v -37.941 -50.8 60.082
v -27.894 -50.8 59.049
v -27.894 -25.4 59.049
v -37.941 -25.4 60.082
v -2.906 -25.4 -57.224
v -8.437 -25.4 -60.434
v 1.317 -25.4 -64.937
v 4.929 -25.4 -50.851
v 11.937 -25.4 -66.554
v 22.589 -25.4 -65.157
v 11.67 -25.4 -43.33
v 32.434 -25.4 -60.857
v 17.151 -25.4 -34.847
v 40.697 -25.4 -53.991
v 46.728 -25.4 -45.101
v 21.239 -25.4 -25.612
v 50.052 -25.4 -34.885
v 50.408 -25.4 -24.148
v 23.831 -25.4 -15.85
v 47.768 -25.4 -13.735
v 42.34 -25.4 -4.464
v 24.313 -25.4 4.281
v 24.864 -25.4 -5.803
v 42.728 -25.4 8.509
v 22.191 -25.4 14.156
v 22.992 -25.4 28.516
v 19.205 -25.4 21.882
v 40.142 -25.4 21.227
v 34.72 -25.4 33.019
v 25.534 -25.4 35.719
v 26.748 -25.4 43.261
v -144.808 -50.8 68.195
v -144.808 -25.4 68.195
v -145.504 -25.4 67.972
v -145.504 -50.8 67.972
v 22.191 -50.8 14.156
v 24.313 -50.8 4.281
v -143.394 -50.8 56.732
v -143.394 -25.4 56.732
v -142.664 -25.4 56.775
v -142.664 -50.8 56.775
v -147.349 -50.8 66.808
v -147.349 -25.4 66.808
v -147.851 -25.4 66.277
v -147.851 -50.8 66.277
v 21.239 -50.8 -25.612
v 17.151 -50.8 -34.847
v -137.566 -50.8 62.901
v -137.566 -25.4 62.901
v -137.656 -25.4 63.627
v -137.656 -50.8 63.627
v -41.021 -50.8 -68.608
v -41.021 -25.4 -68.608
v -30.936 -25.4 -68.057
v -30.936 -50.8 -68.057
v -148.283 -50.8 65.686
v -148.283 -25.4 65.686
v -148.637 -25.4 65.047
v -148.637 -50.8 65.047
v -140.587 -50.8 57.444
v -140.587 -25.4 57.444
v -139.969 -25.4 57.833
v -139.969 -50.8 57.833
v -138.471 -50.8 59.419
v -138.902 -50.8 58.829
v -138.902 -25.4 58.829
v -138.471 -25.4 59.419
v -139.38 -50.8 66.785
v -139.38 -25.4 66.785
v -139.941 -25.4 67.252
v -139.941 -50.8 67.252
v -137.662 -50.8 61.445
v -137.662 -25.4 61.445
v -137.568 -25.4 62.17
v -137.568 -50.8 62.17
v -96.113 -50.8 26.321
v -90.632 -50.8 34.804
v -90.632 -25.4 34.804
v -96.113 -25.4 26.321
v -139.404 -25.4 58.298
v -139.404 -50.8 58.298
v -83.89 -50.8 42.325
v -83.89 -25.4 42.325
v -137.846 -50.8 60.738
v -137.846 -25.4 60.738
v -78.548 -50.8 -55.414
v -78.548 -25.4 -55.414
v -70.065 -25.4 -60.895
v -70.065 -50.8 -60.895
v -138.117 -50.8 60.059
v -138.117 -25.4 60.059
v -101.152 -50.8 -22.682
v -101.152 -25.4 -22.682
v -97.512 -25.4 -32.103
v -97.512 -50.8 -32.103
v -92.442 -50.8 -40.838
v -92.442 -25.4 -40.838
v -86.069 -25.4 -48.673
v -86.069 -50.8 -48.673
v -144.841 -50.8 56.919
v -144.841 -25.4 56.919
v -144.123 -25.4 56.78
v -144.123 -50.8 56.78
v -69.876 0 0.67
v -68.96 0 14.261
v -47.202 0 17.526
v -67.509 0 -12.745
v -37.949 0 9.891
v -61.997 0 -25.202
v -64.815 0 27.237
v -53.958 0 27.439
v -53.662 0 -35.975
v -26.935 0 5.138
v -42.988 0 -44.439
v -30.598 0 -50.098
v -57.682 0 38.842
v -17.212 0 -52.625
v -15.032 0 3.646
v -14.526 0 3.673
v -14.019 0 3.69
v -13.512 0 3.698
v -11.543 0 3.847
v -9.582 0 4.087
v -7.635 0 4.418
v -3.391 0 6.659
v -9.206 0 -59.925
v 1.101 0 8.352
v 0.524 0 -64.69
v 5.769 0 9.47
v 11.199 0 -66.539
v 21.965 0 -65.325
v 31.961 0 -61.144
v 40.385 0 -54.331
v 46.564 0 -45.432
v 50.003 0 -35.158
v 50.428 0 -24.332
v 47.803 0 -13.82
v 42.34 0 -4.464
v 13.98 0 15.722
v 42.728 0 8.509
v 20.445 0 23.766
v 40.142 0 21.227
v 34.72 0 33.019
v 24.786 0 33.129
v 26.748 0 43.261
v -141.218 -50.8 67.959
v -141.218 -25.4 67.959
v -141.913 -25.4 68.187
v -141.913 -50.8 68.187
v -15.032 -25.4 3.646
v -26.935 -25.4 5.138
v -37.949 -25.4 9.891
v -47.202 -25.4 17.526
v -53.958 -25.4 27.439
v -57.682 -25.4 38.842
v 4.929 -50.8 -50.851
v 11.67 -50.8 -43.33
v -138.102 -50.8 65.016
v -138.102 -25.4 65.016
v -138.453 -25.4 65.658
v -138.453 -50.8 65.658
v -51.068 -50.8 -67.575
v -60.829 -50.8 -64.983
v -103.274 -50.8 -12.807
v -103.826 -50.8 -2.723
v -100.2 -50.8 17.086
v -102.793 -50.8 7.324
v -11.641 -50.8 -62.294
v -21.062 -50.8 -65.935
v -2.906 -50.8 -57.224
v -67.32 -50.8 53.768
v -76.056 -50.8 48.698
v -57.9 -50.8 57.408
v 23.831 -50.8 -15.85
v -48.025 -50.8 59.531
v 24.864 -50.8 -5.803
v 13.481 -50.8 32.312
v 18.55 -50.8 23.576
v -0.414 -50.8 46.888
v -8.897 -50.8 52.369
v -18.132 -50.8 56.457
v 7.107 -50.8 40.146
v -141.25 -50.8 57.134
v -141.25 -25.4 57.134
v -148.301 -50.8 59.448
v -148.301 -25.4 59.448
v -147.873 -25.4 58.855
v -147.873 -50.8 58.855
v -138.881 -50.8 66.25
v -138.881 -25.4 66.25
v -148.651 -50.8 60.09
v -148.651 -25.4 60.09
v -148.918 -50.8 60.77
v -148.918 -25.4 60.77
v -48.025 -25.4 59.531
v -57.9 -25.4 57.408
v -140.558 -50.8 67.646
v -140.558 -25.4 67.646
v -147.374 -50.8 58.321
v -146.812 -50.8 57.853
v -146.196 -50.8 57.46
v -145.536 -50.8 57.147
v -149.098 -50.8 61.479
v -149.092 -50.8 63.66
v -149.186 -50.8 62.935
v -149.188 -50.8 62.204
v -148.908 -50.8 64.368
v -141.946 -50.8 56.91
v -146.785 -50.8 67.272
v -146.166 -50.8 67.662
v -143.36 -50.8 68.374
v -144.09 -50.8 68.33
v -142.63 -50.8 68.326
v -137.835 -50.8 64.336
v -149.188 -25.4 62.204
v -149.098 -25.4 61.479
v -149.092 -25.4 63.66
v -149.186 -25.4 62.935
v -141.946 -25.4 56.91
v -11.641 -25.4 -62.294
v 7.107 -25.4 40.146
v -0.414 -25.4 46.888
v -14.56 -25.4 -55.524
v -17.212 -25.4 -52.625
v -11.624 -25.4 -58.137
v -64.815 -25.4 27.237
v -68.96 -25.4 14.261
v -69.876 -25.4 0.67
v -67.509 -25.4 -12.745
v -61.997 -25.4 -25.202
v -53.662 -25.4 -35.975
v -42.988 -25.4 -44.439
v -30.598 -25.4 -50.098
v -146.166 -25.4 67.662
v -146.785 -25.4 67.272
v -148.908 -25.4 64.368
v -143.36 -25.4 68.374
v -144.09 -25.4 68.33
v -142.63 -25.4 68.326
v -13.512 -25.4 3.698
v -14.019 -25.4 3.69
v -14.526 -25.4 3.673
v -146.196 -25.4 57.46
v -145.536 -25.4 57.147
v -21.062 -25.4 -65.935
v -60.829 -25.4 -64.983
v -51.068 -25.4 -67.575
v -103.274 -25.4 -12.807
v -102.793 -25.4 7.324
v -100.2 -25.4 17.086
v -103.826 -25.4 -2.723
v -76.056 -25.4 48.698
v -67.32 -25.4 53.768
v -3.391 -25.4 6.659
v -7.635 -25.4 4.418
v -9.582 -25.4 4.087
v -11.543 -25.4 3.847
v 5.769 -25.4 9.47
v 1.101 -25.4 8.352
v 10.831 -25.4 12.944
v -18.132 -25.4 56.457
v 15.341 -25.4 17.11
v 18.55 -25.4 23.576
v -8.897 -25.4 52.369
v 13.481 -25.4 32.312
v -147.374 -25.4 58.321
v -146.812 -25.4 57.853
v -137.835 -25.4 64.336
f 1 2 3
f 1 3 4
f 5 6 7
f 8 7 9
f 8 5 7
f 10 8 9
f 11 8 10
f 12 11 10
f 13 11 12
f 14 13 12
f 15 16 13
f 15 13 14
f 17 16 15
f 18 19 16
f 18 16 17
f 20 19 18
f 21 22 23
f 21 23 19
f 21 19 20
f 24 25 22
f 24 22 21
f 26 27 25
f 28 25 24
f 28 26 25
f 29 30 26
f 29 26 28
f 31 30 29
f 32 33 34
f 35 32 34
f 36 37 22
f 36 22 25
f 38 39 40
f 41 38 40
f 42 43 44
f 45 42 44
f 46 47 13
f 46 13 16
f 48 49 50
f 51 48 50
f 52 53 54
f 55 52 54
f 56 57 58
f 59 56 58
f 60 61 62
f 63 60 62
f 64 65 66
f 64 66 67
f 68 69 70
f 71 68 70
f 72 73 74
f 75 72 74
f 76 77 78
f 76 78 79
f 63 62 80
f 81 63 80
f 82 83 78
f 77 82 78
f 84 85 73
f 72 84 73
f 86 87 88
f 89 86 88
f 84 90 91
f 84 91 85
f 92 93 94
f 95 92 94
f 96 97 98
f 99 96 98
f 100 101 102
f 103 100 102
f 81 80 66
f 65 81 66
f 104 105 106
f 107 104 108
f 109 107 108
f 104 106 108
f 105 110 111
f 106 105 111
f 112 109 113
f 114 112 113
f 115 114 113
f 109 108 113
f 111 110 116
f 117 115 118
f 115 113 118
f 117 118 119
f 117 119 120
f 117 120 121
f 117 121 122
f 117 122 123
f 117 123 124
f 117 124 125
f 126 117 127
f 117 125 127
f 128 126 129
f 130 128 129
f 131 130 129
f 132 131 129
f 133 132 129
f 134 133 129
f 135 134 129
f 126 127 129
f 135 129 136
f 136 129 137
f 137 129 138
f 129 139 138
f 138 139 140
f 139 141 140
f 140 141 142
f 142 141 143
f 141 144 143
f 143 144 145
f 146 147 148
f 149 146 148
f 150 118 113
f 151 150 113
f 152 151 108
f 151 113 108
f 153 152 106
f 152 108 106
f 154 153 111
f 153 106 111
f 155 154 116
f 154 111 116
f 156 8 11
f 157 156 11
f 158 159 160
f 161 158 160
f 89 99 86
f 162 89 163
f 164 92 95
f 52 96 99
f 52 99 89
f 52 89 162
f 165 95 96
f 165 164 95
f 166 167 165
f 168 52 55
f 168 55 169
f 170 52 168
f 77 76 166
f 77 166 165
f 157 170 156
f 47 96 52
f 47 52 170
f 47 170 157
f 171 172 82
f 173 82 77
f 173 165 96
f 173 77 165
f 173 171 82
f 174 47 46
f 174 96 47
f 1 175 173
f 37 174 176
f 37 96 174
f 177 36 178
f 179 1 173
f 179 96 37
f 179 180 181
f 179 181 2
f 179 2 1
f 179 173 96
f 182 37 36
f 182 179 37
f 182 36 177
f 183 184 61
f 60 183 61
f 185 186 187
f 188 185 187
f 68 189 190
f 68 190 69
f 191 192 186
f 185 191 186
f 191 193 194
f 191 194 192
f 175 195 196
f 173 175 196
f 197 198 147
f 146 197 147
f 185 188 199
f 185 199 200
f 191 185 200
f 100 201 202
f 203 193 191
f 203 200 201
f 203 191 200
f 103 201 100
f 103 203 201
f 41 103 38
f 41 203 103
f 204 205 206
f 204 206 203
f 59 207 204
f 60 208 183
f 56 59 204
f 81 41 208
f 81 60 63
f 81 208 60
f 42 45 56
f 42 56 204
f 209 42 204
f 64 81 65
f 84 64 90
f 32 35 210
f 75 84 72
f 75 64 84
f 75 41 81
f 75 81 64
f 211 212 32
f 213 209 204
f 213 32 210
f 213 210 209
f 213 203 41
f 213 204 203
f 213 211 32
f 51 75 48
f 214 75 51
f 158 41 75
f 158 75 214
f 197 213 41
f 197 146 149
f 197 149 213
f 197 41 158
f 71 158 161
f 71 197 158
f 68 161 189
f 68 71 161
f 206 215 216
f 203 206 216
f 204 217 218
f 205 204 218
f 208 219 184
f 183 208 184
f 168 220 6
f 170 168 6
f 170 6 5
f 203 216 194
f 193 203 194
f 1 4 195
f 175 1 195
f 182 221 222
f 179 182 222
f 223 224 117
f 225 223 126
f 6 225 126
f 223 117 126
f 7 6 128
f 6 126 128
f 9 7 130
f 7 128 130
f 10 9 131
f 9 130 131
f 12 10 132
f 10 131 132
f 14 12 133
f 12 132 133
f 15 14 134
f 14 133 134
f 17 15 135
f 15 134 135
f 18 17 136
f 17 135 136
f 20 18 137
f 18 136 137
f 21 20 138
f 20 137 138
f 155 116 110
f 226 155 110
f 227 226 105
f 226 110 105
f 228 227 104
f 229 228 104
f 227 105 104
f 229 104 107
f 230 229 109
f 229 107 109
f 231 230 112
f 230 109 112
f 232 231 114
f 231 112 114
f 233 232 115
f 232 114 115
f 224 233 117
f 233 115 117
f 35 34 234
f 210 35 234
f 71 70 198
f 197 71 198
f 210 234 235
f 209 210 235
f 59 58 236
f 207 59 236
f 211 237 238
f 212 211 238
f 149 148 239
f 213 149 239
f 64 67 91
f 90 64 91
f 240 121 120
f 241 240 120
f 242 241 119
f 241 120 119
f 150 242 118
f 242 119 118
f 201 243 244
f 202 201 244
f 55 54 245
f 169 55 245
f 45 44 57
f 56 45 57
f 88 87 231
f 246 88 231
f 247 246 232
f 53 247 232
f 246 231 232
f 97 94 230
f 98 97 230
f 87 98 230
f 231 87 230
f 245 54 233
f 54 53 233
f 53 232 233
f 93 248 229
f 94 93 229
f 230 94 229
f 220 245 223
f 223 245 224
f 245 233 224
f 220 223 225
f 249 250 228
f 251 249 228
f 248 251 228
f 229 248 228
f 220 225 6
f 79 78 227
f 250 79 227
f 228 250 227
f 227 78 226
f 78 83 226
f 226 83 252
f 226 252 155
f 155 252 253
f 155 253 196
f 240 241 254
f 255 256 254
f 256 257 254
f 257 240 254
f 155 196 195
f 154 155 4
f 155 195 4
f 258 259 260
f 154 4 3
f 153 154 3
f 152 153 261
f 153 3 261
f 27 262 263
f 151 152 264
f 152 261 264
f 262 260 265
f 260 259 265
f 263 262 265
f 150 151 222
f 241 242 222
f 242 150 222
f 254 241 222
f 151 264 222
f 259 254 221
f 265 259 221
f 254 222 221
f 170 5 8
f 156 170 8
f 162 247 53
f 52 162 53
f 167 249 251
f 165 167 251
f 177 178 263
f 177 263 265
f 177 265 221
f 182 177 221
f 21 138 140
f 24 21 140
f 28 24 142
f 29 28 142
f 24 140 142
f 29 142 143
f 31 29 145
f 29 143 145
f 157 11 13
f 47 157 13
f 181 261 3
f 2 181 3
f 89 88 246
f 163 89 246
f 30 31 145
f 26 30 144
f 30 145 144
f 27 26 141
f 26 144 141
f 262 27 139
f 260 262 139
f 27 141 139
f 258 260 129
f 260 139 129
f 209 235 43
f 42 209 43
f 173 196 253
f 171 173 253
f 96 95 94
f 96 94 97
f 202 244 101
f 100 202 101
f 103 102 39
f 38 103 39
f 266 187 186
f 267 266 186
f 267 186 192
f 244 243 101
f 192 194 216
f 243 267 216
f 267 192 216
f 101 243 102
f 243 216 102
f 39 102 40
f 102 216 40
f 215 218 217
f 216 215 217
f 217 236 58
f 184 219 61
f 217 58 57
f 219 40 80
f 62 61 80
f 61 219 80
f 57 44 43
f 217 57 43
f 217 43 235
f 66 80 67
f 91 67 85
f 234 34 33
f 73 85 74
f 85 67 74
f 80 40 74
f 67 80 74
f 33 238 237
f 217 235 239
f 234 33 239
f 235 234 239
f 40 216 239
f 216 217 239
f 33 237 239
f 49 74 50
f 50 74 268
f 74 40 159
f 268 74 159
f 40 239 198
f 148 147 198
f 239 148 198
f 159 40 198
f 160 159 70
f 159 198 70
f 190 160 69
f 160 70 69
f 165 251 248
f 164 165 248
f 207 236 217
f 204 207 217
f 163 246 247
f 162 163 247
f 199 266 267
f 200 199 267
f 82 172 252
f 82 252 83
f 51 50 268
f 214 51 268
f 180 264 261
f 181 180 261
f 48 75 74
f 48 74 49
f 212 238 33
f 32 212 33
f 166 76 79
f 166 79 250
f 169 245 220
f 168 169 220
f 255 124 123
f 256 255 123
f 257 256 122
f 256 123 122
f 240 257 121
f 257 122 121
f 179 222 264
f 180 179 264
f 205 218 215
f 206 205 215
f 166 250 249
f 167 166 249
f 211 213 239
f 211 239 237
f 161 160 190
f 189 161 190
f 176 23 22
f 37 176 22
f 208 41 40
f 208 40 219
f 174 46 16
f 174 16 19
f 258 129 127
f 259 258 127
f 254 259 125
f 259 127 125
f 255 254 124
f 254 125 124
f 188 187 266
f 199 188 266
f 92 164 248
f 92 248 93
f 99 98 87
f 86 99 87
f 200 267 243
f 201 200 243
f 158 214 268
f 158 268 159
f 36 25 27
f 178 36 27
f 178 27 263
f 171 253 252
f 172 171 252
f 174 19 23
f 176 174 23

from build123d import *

# Parameters (mm, degrees)
F1_DEPTH = 25.4
F3_DEPTH = 25.4


with BuildPart() as f1:
    # F0 (on Front) → F1 (new body)
    with BuildSketch(Plane.XZ):
        with BuildLine():
            ThreePointArc((-15.032011, 3.646128), (-42.845656, 13.381075), (-57.681628, 38.842063))
            ThreePointArc((-57.681628, 38.842063), (-65.130136, -19.139923), (-17.212109, -52.62505))
            ThreePointArc((-17.212109, -52.62505), (-41.574986, -23.503346), (-15.032011, 3.646128))
        make_face()
        with BuildLine():
            ThreePointArc((-15.032011, 3.646128), (-41.574986, -23.503346), (-17.212109, -52.62505))
            ThreePointArc((-17.212109, -52.62505), (21.981795, -40.190329), (42.339665, -4.464406))
            ThreePointArc((42.339665, -4.464406), (25.968523, 7.526778), (5.768808, 9.469525))
            ThreePointArc((5.768808, 9.469525), (-0.719315, 6.376283), (-7.63522, 4.418187))
            ThreePointArc((-7.63522, 4.418187), (-10.561051, 3.956097), (-13.511925, 3.698495))
            ThreePointArc((-13.511925, 3.698495), (-14.271734, 3.665525), (-15.032011, 3.646128))
        make_face()
        with BuildLine():
            ThreePointArc((42.339665, -4.464406), (21.981795, -40.190329), (-17.212109, -52.62505))
            ThreePointArc((-17.212109, -52.62505), (36.414816, -58.0371), (42.339665, -4.464406))
        make_face()
        with BuildLine():
            ThreePointArc((-13.511925, 3.698495), (-14.27232, 3.682526), (-15.032011, 3.646128))
            ThreePointArc((-15.032011, 3.646128), (-14.271734, 3.665525), (-13.511925, 3.698495))
        make_face()
        with BuildLine():
            ThreePointArc((5.768808, 9.469525), (25.968523, 7.526778), (42.339665, -4.464406))
            ThreePointArc((42.339665, -4.464406), (40.142218, 21.227498), (26.747528, 43.261223))
            ThreePointArc((26.747528, 43.261223), (20.4452, 23.765961), (5.768808, 9.469525))
        make_face()
        with BuildLine():
            ThreePointArc((-7.63522, 4.418187), (-0.719315, 6.376283), (5.768808, 9.469525))
            ThreePointArc((5.768808, 9.469525), (-1.171482, 7.576136), (-7.63522, 4.418187))
        make_face()
    extrude(amount=F1_DEPTH)

    # F2 (on face) → F3 (join)
    with BuildSketch(Plane.XZ.offset(25.4)):
        Polygon((-21.062149, -65.934605), (-11.641358, -62.294), (-2.906069, -57.224481), (4.928627, -50.850876), (11.669813, -43.330124), (17.151499, -34.847411), (21.238708, -25.61161), (23.830799, -15.850136), (24.863947, -5.80335), (24.31271, 4.281363), (22.190664, 14.155685), (18.55006, 23.576476), (13.480541, 32.311765), (7.106935, 40.146461), (-0.413817, 46.887647), (-8.89653, 52.369334), (-18.132331, 56.456543), (-27.893805, 59.048634), (-37.940591, 60.081781), (-48.025304, 59.530545), (-57.899625, 57.408498), (-67.320416, 53.767894), (-76.055706, 48.698375), (-83.890402, 42.324769), (-90.631588, 34.804017), (-96.113274, 26.321305), (-100.200483, 17.085503), (-102.792574, 7.32403), (-103.825721, -2.722757), (-103.274485, -12.80747), (-101.152439, -22.681791), (-97.511834, -32.102582), (-92.442315, -40.837871), (-86.06871, -48.672567), (-78.547958, -55.413754), (-70.065245, -60.89544), (-60.829444, -64.982649), (-51.06797, -67.57474), (-41.021184, -68.607887), (-30.936471, -68.056651), align=None)
        Polygon((-139.969022, 57.833415), (-139.404385, 58.297749), (-138.902397, 58.829188), (-138.470974, 59.419353), (-138.11692, 60.058936), (-137.845819, 60.737851), (-137.661946, 61.445389), (-137.568202, 62.170395), (-137.566063, 62.901432), (-137.655565, 63.626973), (-137.835296, 64.335575), (-138.102421, 65.016064), (-138.452727, 65.657707), (-138.88069, 66.250386), (-139.379561, 66.784753), (-139.941472, 67.252381), (-140.557562, 67.645896), (-141.218114, 67.959092), (-141.912711, 68.187028), (-142.630399, 68.326111), (-143.35986, 68.374148), (-144.089589, 68.33038), (-144.808079, 68.195497), (-145.503997, 67.971628), (-146.16637, 67.662302), (-146.784751, 67.272398), (-147.349389, 66.808064), (-147.851377, 66.276625), (-148.2828, 65.68646), (-148.636854, 65.046877), (-148.907955, 64.367963), (-149.091827, 63.660424), (-149.185572, 62.935419), (-149.18771, 62.204381), (-149.098208, 61.47884), (-148.918478, 60.770238), (-148.651353, 60.089749), (-148.301047, 59.448106), (-147.873084, 58.855427), (-147.374213, 58.32106), (-146.812302, 57.853432), (-146.196212, 57.459917), (-145.53566, 57.146721), (-144.841063, 56.918785), (-144.123374, 56.779702), (-143.393914, 56.731665), (-142.664185, 56.775434), (-141.945695, 56.910316), (-141.249776, 57.134185), (-140.587403, 57.443511), align=None)
    extrude(amount=F3_DEPTH)


solid = f1.part
